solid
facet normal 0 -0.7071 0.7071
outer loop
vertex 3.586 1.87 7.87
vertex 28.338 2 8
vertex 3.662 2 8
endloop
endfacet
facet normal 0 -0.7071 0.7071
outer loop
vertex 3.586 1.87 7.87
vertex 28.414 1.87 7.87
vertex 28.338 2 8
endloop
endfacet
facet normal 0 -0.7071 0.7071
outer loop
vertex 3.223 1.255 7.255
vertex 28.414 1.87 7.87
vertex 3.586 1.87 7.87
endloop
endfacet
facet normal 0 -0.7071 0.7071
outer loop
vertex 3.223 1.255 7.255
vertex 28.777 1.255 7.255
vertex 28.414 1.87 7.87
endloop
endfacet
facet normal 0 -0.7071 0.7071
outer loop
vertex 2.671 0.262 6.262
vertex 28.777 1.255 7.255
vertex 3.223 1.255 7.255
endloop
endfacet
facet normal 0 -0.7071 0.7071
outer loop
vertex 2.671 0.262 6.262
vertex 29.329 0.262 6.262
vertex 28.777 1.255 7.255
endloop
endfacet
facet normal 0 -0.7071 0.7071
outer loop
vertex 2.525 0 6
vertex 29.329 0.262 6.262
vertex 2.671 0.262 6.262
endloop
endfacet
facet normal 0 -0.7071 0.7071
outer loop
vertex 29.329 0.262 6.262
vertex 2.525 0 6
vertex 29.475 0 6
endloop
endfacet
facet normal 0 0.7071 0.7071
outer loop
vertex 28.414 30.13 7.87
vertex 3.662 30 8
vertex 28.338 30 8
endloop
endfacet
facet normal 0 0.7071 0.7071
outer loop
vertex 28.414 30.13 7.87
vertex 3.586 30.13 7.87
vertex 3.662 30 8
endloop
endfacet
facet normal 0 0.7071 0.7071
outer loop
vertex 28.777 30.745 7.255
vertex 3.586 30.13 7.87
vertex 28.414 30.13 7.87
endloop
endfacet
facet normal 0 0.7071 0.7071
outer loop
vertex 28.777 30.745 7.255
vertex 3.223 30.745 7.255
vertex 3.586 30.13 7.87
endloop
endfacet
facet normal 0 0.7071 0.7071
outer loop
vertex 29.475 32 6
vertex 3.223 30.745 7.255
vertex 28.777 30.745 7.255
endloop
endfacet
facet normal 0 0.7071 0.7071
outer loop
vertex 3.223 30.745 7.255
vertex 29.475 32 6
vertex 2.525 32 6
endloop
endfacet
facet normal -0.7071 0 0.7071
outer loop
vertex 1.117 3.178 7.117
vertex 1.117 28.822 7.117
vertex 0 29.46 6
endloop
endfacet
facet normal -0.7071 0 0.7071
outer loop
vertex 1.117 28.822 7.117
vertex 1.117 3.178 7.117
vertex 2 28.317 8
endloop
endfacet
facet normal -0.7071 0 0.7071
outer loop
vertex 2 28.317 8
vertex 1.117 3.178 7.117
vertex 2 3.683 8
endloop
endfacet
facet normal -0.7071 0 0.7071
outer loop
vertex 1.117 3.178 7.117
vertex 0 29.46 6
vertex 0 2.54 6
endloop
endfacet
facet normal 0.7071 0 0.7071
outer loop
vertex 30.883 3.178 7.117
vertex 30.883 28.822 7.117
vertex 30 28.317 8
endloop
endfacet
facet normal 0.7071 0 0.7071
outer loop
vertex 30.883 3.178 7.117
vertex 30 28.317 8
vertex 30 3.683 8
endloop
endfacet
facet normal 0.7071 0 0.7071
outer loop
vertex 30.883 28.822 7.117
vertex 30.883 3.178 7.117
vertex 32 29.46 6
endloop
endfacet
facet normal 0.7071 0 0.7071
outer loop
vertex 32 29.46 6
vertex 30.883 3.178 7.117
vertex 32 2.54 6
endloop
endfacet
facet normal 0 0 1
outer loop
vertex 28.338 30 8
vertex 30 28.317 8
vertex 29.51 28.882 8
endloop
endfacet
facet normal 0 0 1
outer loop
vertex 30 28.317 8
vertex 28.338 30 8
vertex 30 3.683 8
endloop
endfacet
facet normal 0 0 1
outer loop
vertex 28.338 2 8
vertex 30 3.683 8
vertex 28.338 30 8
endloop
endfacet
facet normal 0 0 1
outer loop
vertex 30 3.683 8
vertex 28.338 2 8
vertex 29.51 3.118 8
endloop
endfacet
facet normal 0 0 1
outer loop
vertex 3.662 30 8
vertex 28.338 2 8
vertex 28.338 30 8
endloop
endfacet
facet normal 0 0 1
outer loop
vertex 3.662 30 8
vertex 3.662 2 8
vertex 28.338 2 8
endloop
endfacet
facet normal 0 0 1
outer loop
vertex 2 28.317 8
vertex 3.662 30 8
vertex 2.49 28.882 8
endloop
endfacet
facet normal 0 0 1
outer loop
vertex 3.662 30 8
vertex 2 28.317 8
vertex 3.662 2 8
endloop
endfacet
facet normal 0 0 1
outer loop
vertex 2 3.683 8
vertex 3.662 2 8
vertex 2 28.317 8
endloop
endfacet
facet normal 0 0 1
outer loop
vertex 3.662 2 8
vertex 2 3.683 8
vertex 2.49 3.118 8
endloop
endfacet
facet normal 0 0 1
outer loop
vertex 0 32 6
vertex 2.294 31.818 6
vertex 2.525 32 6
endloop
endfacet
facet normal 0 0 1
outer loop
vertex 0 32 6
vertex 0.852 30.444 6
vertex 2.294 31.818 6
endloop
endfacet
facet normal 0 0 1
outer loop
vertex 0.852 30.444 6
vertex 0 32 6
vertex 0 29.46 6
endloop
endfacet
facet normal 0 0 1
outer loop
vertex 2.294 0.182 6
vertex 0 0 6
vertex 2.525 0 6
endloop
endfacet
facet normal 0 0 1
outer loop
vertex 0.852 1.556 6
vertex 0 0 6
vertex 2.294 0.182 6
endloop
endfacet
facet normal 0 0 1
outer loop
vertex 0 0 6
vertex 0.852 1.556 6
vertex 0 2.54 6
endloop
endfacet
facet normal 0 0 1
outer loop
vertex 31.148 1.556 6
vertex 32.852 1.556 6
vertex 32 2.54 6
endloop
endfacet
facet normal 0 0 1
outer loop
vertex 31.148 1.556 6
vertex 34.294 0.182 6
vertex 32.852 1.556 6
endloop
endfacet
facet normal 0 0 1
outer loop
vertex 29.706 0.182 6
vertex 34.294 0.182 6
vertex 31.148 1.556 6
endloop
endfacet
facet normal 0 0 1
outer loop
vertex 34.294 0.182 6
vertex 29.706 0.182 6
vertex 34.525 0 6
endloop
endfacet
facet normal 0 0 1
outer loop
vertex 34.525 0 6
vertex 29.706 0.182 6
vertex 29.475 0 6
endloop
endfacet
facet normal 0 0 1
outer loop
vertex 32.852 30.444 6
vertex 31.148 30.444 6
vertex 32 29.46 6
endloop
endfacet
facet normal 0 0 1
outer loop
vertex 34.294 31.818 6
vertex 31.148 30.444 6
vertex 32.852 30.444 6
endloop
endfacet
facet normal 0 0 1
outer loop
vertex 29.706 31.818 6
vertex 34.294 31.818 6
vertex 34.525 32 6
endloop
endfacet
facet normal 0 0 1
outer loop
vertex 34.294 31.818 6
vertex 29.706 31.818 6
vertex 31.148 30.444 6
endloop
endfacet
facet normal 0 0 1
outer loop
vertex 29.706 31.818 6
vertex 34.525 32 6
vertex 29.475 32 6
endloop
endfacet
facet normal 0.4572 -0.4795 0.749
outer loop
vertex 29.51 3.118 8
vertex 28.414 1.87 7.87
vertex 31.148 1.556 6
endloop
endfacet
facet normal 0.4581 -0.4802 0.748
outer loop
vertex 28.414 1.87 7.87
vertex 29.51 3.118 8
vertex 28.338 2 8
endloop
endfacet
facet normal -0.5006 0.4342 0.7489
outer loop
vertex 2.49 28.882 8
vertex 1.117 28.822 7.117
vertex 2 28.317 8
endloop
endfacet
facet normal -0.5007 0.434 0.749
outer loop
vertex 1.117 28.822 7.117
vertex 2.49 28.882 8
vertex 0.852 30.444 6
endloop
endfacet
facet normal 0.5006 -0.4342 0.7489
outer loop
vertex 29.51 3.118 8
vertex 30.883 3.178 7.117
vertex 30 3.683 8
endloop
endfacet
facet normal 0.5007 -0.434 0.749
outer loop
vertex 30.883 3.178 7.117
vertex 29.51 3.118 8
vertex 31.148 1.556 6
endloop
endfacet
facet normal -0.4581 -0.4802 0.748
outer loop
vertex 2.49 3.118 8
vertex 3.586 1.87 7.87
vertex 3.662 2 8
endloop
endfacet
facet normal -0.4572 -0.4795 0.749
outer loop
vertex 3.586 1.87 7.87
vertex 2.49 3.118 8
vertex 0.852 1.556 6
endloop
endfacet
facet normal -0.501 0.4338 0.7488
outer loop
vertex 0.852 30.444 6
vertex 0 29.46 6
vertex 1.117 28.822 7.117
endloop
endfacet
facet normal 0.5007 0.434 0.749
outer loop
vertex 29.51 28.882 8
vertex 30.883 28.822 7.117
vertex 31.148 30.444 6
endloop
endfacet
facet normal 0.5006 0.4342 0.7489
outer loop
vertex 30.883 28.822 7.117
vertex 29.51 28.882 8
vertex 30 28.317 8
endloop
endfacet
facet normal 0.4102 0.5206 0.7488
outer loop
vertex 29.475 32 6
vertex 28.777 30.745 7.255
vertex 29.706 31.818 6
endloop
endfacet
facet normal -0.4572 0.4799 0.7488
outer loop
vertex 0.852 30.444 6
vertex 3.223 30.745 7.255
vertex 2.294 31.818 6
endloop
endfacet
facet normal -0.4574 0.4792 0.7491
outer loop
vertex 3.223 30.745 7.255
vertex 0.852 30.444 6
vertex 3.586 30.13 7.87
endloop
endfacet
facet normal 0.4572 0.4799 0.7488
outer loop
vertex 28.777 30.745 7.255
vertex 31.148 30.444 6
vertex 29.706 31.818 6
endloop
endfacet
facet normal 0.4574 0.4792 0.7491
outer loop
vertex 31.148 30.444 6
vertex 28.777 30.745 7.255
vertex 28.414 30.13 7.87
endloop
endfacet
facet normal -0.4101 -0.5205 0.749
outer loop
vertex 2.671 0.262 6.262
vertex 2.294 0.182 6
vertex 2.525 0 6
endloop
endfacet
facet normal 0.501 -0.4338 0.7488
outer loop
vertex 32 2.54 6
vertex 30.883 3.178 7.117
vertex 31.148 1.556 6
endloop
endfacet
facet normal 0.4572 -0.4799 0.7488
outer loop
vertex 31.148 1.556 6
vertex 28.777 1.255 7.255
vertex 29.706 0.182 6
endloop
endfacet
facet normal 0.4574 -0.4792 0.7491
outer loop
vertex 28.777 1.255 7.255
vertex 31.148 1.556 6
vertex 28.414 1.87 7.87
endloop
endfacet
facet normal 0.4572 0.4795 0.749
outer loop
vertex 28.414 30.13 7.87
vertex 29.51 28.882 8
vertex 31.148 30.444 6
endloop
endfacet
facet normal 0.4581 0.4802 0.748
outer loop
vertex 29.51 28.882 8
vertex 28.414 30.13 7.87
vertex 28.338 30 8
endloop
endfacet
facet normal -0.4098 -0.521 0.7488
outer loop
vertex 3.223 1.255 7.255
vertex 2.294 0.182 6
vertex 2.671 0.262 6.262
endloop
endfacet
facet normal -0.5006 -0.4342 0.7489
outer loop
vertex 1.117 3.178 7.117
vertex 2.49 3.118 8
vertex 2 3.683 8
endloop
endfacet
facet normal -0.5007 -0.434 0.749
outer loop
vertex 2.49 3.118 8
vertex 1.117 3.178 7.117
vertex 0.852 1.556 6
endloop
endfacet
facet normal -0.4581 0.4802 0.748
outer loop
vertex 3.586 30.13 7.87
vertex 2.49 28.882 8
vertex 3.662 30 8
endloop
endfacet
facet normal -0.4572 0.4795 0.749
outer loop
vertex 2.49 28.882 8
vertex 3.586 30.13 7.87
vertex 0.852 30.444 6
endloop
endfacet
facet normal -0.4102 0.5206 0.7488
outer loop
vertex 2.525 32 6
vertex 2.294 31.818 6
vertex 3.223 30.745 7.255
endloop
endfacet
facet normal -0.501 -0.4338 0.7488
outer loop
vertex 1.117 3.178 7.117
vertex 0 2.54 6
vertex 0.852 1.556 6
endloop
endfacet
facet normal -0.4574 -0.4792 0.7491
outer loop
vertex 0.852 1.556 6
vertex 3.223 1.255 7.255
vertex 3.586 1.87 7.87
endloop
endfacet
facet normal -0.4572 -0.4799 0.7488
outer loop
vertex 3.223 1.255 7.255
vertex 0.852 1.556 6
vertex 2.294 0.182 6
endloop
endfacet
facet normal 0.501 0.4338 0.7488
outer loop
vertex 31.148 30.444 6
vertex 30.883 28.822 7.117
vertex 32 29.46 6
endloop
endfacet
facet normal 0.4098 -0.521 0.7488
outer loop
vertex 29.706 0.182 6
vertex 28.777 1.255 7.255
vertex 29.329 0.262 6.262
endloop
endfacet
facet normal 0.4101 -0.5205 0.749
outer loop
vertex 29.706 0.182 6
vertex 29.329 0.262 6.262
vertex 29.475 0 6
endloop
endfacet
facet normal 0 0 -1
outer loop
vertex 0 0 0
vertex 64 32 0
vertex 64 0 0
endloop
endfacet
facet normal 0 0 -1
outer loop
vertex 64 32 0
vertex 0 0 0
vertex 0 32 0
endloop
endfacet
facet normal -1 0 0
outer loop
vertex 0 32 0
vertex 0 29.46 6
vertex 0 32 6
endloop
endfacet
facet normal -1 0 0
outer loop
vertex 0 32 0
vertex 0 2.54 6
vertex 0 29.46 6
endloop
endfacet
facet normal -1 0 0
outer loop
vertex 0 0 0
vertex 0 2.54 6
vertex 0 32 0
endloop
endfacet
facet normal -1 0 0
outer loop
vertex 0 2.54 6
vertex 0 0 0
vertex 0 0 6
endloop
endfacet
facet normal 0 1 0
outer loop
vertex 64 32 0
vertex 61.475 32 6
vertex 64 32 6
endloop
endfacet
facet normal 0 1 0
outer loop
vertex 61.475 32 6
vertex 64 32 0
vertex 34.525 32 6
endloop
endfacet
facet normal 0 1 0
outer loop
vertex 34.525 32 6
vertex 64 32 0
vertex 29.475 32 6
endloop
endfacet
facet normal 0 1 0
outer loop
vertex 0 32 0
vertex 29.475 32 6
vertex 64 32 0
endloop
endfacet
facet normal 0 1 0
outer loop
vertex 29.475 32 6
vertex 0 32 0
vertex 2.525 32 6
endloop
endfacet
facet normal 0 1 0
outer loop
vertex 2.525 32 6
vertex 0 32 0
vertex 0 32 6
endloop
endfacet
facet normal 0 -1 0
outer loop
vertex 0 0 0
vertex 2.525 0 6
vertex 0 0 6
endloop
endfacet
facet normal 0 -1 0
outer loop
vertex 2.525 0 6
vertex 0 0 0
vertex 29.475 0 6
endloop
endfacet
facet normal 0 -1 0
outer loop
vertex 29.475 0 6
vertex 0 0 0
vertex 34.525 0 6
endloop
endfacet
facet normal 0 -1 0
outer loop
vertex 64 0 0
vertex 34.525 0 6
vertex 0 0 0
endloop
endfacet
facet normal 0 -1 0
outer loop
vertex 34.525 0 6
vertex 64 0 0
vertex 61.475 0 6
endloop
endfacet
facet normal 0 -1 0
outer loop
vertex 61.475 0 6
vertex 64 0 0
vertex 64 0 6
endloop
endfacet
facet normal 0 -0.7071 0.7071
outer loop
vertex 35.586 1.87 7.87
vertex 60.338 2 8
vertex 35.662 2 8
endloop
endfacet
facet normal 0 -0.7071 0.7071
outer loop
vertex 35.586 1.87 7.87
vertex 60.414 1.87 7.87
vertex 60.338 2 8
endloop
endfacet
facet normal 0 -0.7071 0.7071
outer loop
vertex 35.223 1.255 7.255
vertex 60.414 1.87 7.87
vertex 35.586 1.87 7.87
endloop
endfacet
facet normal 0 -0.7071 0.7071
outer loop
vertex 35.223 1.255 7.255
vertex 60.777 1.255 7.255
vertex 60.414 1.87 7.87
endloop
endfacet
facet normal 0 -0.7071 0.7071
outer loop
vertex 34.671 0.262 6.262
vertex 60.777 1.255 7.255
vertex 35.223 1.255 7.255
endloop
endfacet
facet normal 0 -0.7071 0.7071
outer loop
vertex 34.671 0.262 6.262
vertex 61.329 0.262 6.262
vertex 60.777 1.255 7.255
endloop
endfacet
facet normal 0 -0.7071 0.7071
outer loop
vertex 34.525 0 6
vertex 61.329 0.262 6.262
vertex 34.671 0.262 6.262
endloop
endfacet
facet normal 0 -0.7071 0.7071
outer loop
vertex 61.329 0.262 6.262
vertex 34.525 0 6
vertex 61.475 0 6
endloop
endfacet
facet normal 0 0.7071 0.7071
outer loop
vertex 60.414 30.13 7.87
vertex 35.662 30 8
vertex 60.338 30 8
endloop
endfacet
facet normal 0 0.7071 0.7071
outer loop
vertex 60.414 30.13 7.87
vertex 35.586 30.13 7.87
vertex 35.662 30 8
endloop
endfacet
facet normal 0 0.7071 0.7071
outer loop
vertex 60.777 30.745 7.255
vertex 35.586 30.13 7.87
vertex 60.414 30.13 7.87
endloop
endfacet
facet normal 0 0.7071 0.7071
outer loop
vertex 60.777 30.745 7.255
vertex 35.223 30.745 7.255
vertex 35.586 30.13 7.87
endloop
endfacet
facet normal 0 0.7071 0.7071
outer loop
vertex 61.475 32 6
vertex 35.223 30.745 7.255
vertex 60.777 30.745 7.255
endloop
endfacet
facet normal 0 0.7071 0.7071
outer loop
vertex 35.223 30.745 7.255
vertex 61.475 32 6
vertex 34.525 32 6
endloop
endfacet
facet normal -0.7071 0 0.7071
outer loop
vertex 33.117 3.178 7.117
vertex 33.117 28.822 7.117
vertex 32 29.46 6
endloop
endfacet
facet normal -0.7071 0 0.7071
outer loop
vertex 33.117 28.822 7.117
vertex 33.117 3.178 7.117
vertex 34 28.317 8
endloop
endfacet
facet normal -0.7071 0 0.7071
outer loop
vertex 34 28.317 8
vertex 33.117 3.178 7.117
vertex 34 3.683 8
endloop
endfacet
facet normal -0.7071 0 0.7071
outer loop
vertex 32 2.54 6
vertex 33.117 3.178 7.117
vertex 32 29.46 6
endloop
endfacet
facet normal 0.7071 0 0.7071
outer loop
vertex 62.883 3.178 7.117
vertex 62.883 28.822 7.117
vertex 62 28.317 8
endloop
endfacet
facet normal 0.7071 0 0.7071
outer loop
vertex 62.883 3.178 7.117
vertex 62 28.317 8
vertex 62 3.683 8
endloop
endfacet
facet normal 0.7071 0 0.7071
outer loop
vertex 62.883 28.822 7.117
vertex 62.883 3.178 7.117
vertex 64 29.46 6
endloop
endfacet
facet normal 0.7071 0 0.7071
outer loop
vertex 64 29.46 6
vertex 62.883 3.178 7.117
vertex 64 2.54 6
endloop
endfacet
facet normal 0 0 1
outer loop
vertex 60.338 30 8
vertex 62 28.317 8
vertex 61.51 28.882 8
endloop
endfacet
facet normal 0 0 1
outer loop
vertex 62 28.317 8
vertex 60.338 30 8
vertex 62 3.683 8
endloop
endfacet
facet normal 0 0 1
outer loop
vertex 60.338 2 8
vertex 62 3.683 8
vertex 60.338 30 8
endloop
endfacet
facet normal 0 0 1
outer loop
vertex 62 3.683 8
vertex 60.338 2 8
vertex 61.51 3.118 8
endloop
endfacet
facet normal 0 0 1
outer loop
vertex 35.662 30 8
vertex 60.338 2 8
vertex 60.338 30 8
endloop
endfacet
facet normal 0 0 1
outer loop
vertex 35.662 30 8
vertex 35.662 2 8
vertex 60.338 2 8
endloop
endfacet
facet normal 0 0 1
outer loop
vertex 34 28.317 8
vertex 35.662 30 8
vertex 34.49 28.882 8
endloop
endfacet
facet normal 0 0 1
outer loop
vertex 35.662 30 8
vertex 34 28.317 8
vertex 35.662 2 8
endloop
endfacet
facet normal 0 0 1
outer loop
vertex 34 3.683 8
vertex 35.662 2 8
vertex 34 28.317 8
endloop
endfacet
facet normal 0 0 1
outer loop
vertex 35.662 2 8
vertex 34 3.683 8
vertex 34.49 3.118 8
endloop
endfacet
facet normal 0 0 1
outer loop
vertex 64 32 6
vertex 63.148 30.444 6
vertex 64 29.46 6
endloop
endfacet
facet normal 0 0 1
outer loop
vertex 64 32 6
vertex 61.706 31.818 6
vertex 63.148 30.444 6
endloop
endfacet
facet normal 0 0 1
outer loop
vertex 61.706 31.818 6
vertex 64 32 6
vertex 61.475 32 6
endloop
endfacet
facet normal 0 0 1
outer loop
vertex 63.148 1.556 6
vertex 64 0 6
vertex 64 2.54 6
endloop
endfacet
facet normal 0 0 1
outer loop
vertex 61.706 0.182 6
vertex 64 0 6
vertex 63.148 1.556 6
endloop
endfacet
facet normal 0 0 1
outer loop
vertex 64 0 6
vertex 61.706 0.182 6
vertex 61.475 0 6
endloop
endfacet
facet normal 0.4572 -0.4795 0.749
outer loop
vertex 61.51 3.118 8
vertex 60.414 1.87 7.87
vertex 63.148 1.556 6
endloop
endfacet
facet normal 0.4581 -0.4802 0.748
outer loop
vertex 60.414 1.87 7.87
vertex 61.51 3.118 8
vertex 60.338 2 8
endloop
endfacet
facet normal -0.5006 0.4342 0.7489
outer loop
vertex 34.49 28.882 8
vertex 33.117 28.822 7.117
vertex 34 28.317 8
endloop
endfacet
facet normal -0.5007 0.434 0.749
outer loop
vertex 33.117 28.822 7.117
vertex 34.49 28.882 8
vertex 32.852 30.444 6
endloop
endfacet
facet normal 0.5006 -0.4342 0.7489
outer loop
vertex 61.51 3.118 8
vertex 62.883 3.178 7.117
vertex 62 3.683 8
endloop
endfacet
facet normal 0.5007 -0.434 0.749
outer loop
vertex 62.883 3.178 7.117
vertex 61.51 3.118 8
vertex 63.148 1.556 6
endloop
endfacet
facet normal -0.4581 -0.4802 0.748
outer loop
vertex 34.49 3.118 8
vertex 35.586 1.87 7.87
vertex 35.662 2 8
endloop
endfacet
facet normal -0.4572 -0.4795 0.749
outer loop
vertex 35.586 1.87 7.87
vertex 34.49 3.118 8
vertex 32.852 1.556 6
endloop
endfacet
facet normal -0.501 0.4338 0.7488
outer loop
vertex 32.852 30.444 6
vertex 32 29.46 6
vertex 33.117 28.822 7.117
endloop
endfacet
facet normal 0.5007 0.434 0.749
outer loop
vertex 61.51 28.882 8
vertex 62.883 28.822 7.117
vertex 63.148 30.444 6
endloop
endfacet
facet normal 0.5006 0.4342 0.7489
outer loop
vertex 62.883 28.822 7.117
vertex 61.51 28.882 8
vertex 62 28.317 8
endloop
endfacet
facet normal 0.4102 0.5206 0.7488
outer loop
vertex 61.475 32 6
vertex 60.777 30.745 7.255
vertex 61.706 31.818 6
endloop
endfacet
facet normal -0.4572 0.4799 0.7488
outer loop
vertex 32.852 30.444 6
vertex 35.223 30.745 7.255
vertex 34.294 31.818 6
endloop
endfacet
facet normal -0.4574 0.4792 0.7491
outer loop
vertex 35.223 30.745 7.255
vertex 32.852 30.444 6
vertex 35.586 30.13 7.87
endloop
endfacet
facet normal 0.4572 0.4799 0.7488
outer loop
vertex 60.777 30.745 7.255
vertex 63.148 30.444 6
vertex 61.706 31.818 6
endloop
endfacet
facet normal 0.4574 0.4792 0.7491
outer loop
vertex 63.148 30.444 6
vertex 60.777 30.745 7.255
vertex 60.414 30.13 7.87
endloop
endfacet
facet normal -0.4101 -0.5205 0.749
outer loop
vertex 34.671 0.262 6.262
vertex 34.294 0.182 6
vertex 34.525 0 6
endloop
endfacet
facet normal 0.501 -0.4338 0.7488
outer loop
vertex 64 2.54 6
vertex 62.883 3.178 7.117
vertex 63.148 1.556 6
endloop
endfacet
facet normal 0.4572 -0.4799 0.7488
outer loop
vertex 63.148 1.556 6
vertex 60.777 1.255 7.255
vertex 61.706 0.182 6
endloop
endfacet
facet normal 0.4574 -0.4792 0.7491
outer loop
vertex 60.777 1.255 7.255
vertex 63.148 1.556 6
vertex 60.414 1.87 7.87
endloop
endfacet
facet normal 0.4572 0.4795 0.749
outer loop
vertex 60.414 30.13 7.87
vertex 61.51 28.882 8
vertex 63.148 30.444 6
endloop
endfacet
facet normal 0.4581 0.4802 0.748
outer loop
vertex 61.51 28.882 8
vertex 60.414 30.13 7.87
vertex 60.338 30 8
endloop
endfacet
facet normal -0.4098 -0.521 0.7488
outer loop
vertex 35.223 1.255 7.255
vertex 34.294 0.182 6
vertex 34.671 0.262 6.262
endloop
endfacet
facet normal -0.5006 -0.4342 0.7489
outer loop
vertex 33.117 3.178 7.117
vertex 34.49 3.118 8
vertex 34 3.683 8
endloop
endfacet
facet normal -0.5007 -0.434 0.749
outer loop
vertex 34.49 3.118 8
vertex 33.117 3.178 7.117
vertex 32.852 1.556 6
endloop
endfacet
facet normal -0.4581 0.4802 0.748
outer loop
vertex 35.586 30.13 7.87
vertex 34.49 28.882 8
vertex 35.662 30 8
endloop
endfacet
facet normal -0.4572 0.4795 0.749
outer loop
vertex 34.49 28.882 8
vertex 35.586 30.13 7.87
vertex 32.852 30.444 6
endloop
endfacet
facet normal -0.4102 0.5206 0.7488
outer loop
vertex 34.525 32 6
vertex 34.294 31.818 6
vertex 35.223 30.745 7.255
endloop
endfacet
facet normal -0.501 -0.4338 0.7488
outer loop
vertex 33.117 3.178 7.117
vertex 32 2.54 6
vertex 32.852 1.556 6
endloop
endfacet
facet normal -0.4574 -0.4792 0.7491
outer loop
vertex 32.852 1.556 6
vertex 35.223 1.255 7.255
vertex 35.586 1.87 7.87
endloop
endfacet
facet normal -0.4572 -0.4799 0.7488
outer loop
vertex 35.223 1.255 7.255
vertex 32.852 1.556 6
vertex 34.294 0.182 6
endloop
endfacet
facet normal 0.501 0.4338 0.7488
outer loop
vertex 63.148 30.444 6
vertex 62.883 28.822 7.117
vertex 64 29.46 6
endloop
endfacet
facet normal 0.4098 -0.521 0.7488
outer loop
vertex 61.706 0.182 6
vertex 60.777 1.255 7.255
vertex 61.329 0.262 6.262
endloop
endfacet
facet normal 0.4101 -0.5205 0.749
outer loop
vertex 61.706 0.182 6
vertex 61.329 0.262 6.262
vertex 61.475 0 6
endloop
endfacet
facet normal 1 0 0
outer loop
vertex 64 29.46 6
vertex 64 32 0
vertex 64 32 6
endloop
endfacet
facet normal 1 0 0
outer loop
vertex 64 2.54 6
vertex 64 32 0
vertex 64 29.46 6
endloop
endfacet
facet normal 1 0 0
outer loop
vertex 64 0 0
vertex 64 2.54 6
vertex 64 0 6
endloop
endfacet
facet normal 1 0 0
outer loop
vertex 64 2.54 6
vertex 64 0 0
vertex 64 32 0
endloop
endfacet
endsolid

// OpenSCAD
// file: ModularDungeonTileLibrary.scad
//Constants
wallleft = 0;
wallbottom = 1;
wallright = 2;
walltop = 3;
wallcenter = 4;
walldoubleright = 5;


//Variables
size = 32;
baseheight = 6;
topperheight = 2;
topperrounded = true;
walllength = size;
wallheight = 25 + baseheight + topperheight;
wallwidth = 6;
wallwidththin = 4;


//Functions
function hypotenuse_ra(side_a, side_b) =
    sqrt(pow(side_a, 2) + pow(side_b, 2));
    
    
//Modules    
module mdtl_Base(s,bh)
{
    cube([s,s,bh]);
}

module mdtl_Topper(s,bh,th,tr)
{
    if (tr) {
        translate([0,0,bh])
            intersection() {
                difference () {
                        cube([s,s,th]);
                        union () {
                        rotate(a=45, v=[1,0,0])
                            cube([s,th*2,th*2]);
                        translate([0,s,0])
                            rotate(a=45, v=[1,0,0])
                                cube([s,th*2,th*2]);
                        rotate(a=-45, v=[0,1,0])
                            cube([th*2,s,th*2]);
                        translate([s,0,0])
                            rotate(a=-45, v=[0,1,0])
                                cube([th*2,s,th*2]);
                        }
                }
                translate([s/2,s/2,0])
                    cylinder(
                        h=th, 
                        r1=hypotenuse_ra(s/2-1.2, s/2-1.2), 
                        r2=hypotenuse_ra(s/2-th-.8, s/2-th-.8), 
                        center=false, 
                        $fa=.1);
            }    
    }
    else {
        translate([0,0,bh])
            difference() {
                cube([s,s,th]);
                union () {
                rotate(a=45, v=[1,0,0])
                    cube([s,th*2,th*2]);
                translate([0,s,0])
                    rotate(a=45, v=[1,0,0])
                        cube([s,th*2,th*2]);
                rotate(a=-45, v=[0,1,0])
                    cube([th*2,s,th*2]);
                translate([s,0,0])
                    rotate(a=-45, v=[0,1,0])
                        cube([th*2,s,th*2]);
                }
            }    
    }
}

module mdtl_Base_1x1(s,bh,th,tr) 
{
    union () {
        mdtl_Base(s,bh);
        mdtl_Topper(s,bh,th,tr);
    }
}

module mdtl_Base_1x2(s,bh,th,tr)
{
    union () {
        mdtl_Base_1x1(s,bh,th,tr);
        translate([s,0,0])
            mdtl_Base_1x1(s,bh,th,tr);
    }
}
 
module mdtl_Base_2x2(s,bh,th,tr)
{
    union () {
        mdtl_Base_1x2(s,bh,th,tr);
        translate([0,s,0])
            mdtl_Base_1x2(s,bh,th,tr);
    }
}
 
module mdtl_Base_2x4(s,bh,th,tr)
{
    union () {
        mdtl_Base_2x2(s,bh,th,tr);
        translate([s*2,0,0])
            mdtl_Base_2x2(s,bh,th,tr);
    }
}
 
module mdtl_Base_4x4(s,bh,th,tr)
{
    union () {
        mdtl_Base_2x4(s,bh,th,tr);
        translate([0,s*2,0])
            mdtl_Base_2x4(s,bh,th,tr);
    }
}
 
module mdtl_Wall_1(w,l,h)
{
    cube([w,l,h]);   
}

module mdtl_Wall_1_Position(w,l,h,p)
{
    if (p==0) {
        mdtl_Wall_1(w,l,h);
    }
    
    else if (p==1) {
        rotate(a=-90)
           translate([-w,0,0])
               mdtl_Wall_1(w,l,h);       
    }
    
    else if (p==2) {
        translate([(size)-w,0,0])
            mdtl_Wall_1(w,l,h);
    }
    
    else if (p==3) {
        rotate(a=-90)
            translate([-l,0,0])
                mdtl_Wall_1(w,l,h);
    }
    
    else if (p==4) {
        translate([(size)-w/2,0,0])
            mdtl_Wall_1(w,l,h);
    }
    
    else if (p==5) {
        translate([(size*2)-w,0,0])
           mdtl_Wall_1(w,l,h);       
    }
}

module mdtl_Wall_2(w,l,h)
{
    union() {
        mdtl_Wall_1(w,l,h);
        translate([0,l,0])
            mdtl_Wall_1(w,l,h);
    }
}

module mdtl_Wall_2_Position(w,l,h,p)
{
    if (p==0) {
        mdtl_Wall_2(w,l,h);
    }
    
    else if (p==1) {
        rotate(a=-90)
            translate([-w,0,0])
                mdtl_Wall_2(w,l,h);
    }
    
    else if (p==2) {
    translate([(size*2)-w,0,0])
        mdtl_Wall_2(w,l,h);
    }
    
    else if (p==3) {
        rotate(a=-90)
            translate([-l*2,0,0])
                mdtl_Wall_2(w,l,h);
    }
    
    else if (p==4) {
        translate([(size)-w/2,0,0])
            mdtl_Wall_2(w,l,h);
    }
}
// main file
include <ModularDungeonTileLibrary.scad>; 

mdtl_Base_1x2(size,baseheight,topperheight,topperrounded);
